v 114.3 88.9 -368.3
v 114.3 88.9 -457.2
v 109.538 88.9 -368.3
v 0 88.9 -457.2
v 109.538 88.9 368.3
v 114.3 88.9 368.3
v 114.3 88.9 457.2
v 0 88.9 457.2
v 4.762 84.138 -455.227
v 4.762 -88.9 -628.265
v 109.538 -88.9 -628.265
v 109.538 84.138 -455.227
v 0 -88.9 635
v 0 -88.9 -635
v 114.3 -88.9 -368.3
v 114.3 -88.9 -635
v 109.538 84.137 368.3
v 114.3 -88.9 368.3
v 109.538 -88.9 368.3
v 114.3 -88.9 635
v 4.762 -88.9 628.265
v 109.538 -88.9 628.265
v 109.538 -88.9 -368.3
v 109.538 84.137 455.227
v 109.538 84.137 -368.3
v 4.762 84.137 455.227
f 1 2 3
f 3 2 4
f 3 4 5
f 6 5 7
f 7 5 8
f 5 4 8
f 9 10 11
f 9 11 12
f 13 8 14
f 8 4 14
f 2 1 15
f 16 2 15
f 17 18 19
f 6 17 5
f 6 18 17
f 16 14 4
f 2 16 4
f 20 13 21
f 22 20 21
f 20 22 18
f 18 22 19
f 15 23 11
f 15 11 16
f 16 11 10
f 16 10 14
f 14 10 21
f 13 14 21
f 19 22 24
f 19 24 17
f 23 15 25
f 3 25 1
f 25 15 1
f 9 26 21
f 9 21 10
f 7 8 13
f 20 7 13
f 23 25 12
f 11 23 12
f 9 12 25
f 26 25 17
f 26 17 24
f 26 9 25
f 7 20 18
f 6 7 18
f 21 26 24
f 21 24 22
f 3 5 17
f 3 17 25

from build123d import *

# Parameters (mm, degrees)
BOSS_EXTRUDE1_DEPTH = 114.3
SHELL3_T            = -4.7625
SKETCH8_W           = 736.6
SKETCH8_H           = 177.8
CUT_EXTRUDE2_DEPTH  = 4.7625


with BuildPart() as part:
    # Sketch1 → Boss-Extrude1 (new body)
    with BuildSketch(Plane(origin=(0, 0, 0), x_dir=(0, 0, -1), z_dir=(1, 0, 0))):
        Polygon((-457.2, 88.9), (-635, -88.9), (-457.2, -88.9), (457.2, -88.9), (635, -88.9), (457.2, 88.9), align=None)
    extrude(amount=BOSS_EXTRUDE1_DEPTH)

    # Shell3
    shell3_openings = [part.faces().sort_by_distance(p)[0] for p in [
        (57.15, -88.9, 0),
    ]]
    offset(amount=SHELL3_T, openings=shell3_openings, kind=Kind.INTERSECTION)

    # Sketch8 → Cut-Extrude2 (cut)
    with BuildSketch(Plane(origin=(114.3, 0, 0), x_dir=(0, 0, -1), z_dir=(1, 0, 0))):
        Rectangle(SKETCH8_W, SKETCH8_H)
    extrude(amount=-CUT_EXTRUDE2_DEPTH, mode=Mode.SUBTRACT)


solid = part.part
